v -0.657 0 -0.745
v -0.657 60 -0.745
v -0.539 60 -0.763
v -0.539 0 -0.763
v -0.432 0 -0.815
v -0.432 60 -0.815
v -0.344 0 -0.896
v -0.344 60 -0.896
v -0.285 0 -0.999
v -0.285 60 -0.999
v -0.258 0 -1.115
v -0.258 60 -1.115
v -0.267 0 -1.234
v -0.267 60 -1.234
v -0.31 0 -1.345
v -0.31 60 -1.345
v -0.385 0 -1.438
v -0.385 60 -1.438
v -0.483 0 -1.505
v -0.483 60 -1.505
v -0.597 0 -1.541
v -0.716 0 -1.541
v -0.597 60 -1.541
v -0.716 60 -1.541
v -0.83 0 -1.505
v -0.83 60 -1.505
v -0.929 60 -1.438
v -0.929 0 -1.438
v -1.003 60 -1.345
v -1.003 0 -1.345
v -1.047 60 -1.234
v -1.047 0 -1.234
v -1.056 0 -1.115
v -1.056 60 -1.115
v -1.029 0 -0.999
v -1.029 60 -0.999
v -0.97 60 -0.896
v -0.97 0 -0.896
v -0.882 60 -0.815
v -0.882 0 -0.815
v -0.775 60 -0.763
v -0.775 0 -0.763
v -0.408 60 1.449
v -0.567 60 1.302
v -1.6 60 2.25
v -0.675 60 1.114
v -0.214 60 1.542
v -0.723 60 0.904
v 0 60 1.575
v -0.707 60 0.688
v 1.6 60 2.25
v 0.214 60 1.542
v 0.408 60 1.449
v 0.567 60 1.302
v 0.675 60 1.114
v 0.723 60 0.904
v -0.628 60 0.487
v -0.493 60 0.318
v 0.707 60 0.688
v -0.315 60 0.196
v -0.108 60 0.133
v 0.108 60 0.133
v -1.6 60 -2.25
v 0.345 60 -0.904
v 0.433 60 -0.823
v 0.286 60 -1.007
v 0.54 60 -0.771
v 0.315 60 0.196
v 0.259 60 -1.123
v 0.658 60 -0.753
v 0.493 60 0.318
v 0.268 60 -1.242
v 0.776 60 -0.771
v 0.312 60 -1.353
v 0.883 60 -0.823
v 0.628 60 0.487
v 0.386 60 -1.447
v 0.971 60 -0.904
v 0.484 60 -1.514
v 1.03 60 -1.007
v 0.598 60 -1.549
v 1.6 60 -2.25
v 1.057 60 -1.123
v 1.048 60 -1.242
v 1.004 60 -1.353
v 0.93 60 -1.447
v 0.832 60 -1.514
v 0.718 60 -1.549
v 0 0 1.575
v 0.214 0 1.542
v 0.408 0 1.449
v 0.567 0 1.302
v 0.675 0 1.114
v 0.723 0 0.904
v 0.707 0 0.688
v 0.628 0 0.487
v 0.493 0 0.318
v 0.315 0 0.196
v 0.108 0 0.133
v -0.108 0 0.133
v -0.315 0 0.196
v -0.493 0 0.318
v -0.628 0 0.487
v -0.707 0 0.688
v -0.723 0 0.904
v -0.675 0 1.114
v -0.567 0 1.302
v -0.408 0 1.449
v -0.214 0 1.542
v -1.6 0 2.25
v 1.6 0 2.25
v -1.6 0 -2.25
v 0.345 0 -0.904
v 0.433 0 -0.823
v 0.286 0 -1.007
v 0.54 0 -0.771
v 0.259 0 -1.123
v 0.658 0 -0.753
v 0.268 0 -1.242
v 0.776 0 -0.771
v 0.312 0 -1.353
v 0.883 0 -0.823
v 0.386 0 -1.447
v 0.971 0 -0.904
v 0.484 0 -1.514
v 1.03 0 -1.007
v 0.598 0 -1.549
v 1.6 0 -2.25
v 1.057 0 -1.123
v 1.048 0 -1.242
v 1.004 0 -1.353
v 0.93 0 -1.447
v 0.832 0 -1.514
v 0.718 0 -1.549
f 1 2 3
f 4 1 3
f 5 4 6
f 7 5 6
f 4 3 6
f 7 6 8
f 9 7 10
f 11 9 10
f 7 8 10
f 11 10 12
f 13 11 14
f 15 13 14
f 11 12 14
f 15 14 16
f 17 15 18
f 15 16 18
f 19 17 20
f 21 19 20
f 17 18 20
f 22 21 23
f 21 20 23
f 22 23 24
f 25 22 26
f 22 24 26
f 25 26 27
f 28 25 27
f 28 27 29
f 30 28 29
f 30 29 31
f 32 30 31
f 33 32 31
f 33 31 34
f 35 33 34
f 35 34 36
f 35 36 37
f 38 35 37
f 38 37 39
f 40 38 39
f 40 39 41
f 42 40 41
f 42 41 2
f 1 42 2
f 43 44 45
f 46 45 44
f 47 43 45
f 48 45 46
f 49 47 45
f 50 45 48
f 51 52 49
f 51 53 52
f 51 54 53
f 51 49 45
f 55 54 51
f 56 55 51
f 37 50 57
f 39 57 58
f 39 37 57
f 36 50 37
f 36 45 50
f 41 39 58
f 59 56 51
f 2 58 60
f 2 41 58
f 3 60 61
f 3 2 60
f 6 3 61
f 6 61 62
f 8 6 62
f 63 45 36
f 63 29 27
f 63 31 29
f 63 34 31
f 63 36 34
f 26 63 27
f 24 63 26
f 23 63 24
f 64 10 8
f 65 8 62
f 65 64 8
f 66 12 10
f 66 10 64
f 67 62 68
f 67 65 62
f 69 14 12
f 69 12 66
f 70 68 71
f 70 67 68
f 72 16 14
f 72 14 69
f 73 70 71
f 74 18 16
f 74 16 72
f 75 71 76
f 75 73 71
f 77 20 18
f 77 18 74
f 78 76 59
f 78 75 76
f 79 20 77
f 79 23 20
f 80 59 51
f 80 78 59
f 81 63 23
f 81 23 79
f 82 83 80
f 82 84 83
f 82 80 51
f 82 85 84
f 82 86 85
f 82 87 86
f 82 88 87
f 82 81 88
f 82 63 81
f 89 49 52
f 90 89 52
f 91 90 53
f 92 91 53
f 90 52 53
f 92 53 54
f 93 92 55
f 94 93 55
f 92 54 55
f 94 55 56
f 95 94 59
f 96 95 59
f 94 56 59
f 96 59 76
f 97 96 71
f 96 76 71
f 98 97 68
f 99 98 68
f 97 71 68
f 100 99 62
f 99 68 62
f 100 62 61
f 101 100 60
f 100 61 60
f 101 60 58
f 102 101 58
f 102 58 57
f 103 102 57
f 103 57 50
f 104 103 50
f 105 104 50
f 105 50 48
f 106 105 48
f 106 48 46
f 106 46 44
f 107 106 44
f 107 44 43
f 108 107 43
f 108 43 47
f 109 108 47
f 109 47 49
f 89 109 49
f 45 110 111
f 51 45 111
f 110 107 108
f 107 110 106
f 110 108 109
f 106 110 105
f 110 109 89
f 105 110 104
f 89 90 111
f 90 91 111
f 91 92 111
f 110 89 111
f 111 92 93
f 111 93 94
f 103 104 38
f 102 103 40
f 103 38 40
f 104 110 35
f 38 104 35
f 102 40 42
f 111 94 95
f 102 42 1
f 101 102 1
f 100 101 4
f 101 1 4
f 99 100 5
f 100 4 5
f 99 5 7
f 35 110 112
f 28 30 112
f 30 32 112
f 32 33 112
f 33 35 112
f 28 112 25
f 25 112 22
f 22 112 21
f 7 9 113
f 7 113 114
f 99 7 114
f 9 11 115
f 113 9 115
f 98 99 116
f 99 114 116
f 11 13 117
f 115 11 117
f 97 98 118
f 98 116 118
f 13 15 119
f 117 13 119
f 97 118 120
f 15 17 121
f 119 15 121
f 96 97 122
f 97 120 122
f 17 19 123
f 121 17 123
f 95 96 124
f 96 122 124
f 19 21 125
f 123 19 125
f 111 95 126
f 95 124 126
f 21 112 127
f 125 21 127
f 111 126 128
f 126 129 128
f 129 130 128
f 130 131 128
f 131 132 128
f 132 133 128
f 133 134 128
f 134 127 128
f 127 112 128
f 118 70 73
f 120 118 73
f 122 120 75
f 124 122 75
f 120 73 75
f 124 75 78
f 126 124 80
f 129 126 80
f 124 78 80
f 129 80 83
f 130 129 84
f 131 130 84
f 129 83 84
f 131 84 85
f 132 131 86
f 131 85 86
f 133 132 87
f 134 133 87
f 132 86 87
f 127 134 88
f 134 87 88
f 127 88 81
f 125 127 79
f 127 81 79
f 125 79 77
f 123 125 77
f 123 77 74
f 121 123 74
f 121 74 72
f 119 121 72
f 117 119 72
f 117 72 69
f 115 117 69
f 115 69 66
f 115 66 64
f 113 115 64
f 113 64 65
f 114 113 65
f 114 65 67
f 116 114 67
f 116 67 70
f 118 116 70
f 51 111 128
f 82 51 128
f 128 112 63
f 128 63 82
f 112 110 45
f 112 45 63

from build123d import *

# Parameters (mm, degrees)
SKETCH2_W           = 3.2
SKETCH2_H           = 4.5
BOSS_EXTRUDE1_DEPTH = 59.999999888
SKETCH5_R           = 0.724999947
CUT_EXTRUDE1_DEPTH  = 60.999999888
SKETCH6_R           = 0.399999962
CUT_EXTRUDE2_DEPTH  = 60.999999888
SKETCH7_R           = 0.4
CUT_EXTRUDE3_DEPTH  = 60.999999888


with BuildPart() as part:
    # Sketch2 → Boss-Extrude1 (new body)
    with BuildSketch(Plane(origin=(0, 0, 0), x_dir=(1, 0, 0), z_dir=(0, 1, 0))):
        Rectangle(SKETCH2_W, SKETCH2_H)
    extrude(amount=BOSS_EXTRUDE1_DEPTH)

    # Sketch5 → Cut-Extrude1 (cut, through all)
    with BuildSketch(Plane(origin=(0, 59.999999888, 0), x_dir=(-1, 0, 0), z_dir=(0, 1, 0))):
        with Locations(Location((0, 0.849563353, 0), (0, 0, 90))):  # turned: the seam where the file's is
            Circle(SKETCH5_R)
    extrude(amount=-CUT_EXTRUDE1_DEPTH, mode=Mode.SUBTRACT)

    # Sketch6 → Cut-Extrude2 (cut, through all)
    with BuildSketch(Plane(origin=(0, 59.999999888, 0), x_dir=(-1, 0, 0), z_dir=(0, 1, 0))):
        with Locations(Location((0.656880529, -1.145056402, 0), (0, 0, 90))):  # turned: the seam where the file's is
            Circle(SKETCH6_R)
    extrude(amount=-CUT_EXTRUDE2_DEPTH, mode=Mode.SUBTRACT)

    # Sketch7 → Cut-Extrude3 (cut, through all)
    with BuildSketch(Plane(origin=(0, 59.999999888, 0), x_dir=(-1, 0, 0), z_dir=(0, 1, 0))):
        with Locations(Location((-0.657995536, -1.153321844, 0), (0, 0, 90))):  # turned: the seam where the file's is
            Circle(SKETCH7_R)
    extrude(amount=-CUT_EXTRUDE3_DEPTH, mode=Mode.SUBTRACT)


solid = part.part
